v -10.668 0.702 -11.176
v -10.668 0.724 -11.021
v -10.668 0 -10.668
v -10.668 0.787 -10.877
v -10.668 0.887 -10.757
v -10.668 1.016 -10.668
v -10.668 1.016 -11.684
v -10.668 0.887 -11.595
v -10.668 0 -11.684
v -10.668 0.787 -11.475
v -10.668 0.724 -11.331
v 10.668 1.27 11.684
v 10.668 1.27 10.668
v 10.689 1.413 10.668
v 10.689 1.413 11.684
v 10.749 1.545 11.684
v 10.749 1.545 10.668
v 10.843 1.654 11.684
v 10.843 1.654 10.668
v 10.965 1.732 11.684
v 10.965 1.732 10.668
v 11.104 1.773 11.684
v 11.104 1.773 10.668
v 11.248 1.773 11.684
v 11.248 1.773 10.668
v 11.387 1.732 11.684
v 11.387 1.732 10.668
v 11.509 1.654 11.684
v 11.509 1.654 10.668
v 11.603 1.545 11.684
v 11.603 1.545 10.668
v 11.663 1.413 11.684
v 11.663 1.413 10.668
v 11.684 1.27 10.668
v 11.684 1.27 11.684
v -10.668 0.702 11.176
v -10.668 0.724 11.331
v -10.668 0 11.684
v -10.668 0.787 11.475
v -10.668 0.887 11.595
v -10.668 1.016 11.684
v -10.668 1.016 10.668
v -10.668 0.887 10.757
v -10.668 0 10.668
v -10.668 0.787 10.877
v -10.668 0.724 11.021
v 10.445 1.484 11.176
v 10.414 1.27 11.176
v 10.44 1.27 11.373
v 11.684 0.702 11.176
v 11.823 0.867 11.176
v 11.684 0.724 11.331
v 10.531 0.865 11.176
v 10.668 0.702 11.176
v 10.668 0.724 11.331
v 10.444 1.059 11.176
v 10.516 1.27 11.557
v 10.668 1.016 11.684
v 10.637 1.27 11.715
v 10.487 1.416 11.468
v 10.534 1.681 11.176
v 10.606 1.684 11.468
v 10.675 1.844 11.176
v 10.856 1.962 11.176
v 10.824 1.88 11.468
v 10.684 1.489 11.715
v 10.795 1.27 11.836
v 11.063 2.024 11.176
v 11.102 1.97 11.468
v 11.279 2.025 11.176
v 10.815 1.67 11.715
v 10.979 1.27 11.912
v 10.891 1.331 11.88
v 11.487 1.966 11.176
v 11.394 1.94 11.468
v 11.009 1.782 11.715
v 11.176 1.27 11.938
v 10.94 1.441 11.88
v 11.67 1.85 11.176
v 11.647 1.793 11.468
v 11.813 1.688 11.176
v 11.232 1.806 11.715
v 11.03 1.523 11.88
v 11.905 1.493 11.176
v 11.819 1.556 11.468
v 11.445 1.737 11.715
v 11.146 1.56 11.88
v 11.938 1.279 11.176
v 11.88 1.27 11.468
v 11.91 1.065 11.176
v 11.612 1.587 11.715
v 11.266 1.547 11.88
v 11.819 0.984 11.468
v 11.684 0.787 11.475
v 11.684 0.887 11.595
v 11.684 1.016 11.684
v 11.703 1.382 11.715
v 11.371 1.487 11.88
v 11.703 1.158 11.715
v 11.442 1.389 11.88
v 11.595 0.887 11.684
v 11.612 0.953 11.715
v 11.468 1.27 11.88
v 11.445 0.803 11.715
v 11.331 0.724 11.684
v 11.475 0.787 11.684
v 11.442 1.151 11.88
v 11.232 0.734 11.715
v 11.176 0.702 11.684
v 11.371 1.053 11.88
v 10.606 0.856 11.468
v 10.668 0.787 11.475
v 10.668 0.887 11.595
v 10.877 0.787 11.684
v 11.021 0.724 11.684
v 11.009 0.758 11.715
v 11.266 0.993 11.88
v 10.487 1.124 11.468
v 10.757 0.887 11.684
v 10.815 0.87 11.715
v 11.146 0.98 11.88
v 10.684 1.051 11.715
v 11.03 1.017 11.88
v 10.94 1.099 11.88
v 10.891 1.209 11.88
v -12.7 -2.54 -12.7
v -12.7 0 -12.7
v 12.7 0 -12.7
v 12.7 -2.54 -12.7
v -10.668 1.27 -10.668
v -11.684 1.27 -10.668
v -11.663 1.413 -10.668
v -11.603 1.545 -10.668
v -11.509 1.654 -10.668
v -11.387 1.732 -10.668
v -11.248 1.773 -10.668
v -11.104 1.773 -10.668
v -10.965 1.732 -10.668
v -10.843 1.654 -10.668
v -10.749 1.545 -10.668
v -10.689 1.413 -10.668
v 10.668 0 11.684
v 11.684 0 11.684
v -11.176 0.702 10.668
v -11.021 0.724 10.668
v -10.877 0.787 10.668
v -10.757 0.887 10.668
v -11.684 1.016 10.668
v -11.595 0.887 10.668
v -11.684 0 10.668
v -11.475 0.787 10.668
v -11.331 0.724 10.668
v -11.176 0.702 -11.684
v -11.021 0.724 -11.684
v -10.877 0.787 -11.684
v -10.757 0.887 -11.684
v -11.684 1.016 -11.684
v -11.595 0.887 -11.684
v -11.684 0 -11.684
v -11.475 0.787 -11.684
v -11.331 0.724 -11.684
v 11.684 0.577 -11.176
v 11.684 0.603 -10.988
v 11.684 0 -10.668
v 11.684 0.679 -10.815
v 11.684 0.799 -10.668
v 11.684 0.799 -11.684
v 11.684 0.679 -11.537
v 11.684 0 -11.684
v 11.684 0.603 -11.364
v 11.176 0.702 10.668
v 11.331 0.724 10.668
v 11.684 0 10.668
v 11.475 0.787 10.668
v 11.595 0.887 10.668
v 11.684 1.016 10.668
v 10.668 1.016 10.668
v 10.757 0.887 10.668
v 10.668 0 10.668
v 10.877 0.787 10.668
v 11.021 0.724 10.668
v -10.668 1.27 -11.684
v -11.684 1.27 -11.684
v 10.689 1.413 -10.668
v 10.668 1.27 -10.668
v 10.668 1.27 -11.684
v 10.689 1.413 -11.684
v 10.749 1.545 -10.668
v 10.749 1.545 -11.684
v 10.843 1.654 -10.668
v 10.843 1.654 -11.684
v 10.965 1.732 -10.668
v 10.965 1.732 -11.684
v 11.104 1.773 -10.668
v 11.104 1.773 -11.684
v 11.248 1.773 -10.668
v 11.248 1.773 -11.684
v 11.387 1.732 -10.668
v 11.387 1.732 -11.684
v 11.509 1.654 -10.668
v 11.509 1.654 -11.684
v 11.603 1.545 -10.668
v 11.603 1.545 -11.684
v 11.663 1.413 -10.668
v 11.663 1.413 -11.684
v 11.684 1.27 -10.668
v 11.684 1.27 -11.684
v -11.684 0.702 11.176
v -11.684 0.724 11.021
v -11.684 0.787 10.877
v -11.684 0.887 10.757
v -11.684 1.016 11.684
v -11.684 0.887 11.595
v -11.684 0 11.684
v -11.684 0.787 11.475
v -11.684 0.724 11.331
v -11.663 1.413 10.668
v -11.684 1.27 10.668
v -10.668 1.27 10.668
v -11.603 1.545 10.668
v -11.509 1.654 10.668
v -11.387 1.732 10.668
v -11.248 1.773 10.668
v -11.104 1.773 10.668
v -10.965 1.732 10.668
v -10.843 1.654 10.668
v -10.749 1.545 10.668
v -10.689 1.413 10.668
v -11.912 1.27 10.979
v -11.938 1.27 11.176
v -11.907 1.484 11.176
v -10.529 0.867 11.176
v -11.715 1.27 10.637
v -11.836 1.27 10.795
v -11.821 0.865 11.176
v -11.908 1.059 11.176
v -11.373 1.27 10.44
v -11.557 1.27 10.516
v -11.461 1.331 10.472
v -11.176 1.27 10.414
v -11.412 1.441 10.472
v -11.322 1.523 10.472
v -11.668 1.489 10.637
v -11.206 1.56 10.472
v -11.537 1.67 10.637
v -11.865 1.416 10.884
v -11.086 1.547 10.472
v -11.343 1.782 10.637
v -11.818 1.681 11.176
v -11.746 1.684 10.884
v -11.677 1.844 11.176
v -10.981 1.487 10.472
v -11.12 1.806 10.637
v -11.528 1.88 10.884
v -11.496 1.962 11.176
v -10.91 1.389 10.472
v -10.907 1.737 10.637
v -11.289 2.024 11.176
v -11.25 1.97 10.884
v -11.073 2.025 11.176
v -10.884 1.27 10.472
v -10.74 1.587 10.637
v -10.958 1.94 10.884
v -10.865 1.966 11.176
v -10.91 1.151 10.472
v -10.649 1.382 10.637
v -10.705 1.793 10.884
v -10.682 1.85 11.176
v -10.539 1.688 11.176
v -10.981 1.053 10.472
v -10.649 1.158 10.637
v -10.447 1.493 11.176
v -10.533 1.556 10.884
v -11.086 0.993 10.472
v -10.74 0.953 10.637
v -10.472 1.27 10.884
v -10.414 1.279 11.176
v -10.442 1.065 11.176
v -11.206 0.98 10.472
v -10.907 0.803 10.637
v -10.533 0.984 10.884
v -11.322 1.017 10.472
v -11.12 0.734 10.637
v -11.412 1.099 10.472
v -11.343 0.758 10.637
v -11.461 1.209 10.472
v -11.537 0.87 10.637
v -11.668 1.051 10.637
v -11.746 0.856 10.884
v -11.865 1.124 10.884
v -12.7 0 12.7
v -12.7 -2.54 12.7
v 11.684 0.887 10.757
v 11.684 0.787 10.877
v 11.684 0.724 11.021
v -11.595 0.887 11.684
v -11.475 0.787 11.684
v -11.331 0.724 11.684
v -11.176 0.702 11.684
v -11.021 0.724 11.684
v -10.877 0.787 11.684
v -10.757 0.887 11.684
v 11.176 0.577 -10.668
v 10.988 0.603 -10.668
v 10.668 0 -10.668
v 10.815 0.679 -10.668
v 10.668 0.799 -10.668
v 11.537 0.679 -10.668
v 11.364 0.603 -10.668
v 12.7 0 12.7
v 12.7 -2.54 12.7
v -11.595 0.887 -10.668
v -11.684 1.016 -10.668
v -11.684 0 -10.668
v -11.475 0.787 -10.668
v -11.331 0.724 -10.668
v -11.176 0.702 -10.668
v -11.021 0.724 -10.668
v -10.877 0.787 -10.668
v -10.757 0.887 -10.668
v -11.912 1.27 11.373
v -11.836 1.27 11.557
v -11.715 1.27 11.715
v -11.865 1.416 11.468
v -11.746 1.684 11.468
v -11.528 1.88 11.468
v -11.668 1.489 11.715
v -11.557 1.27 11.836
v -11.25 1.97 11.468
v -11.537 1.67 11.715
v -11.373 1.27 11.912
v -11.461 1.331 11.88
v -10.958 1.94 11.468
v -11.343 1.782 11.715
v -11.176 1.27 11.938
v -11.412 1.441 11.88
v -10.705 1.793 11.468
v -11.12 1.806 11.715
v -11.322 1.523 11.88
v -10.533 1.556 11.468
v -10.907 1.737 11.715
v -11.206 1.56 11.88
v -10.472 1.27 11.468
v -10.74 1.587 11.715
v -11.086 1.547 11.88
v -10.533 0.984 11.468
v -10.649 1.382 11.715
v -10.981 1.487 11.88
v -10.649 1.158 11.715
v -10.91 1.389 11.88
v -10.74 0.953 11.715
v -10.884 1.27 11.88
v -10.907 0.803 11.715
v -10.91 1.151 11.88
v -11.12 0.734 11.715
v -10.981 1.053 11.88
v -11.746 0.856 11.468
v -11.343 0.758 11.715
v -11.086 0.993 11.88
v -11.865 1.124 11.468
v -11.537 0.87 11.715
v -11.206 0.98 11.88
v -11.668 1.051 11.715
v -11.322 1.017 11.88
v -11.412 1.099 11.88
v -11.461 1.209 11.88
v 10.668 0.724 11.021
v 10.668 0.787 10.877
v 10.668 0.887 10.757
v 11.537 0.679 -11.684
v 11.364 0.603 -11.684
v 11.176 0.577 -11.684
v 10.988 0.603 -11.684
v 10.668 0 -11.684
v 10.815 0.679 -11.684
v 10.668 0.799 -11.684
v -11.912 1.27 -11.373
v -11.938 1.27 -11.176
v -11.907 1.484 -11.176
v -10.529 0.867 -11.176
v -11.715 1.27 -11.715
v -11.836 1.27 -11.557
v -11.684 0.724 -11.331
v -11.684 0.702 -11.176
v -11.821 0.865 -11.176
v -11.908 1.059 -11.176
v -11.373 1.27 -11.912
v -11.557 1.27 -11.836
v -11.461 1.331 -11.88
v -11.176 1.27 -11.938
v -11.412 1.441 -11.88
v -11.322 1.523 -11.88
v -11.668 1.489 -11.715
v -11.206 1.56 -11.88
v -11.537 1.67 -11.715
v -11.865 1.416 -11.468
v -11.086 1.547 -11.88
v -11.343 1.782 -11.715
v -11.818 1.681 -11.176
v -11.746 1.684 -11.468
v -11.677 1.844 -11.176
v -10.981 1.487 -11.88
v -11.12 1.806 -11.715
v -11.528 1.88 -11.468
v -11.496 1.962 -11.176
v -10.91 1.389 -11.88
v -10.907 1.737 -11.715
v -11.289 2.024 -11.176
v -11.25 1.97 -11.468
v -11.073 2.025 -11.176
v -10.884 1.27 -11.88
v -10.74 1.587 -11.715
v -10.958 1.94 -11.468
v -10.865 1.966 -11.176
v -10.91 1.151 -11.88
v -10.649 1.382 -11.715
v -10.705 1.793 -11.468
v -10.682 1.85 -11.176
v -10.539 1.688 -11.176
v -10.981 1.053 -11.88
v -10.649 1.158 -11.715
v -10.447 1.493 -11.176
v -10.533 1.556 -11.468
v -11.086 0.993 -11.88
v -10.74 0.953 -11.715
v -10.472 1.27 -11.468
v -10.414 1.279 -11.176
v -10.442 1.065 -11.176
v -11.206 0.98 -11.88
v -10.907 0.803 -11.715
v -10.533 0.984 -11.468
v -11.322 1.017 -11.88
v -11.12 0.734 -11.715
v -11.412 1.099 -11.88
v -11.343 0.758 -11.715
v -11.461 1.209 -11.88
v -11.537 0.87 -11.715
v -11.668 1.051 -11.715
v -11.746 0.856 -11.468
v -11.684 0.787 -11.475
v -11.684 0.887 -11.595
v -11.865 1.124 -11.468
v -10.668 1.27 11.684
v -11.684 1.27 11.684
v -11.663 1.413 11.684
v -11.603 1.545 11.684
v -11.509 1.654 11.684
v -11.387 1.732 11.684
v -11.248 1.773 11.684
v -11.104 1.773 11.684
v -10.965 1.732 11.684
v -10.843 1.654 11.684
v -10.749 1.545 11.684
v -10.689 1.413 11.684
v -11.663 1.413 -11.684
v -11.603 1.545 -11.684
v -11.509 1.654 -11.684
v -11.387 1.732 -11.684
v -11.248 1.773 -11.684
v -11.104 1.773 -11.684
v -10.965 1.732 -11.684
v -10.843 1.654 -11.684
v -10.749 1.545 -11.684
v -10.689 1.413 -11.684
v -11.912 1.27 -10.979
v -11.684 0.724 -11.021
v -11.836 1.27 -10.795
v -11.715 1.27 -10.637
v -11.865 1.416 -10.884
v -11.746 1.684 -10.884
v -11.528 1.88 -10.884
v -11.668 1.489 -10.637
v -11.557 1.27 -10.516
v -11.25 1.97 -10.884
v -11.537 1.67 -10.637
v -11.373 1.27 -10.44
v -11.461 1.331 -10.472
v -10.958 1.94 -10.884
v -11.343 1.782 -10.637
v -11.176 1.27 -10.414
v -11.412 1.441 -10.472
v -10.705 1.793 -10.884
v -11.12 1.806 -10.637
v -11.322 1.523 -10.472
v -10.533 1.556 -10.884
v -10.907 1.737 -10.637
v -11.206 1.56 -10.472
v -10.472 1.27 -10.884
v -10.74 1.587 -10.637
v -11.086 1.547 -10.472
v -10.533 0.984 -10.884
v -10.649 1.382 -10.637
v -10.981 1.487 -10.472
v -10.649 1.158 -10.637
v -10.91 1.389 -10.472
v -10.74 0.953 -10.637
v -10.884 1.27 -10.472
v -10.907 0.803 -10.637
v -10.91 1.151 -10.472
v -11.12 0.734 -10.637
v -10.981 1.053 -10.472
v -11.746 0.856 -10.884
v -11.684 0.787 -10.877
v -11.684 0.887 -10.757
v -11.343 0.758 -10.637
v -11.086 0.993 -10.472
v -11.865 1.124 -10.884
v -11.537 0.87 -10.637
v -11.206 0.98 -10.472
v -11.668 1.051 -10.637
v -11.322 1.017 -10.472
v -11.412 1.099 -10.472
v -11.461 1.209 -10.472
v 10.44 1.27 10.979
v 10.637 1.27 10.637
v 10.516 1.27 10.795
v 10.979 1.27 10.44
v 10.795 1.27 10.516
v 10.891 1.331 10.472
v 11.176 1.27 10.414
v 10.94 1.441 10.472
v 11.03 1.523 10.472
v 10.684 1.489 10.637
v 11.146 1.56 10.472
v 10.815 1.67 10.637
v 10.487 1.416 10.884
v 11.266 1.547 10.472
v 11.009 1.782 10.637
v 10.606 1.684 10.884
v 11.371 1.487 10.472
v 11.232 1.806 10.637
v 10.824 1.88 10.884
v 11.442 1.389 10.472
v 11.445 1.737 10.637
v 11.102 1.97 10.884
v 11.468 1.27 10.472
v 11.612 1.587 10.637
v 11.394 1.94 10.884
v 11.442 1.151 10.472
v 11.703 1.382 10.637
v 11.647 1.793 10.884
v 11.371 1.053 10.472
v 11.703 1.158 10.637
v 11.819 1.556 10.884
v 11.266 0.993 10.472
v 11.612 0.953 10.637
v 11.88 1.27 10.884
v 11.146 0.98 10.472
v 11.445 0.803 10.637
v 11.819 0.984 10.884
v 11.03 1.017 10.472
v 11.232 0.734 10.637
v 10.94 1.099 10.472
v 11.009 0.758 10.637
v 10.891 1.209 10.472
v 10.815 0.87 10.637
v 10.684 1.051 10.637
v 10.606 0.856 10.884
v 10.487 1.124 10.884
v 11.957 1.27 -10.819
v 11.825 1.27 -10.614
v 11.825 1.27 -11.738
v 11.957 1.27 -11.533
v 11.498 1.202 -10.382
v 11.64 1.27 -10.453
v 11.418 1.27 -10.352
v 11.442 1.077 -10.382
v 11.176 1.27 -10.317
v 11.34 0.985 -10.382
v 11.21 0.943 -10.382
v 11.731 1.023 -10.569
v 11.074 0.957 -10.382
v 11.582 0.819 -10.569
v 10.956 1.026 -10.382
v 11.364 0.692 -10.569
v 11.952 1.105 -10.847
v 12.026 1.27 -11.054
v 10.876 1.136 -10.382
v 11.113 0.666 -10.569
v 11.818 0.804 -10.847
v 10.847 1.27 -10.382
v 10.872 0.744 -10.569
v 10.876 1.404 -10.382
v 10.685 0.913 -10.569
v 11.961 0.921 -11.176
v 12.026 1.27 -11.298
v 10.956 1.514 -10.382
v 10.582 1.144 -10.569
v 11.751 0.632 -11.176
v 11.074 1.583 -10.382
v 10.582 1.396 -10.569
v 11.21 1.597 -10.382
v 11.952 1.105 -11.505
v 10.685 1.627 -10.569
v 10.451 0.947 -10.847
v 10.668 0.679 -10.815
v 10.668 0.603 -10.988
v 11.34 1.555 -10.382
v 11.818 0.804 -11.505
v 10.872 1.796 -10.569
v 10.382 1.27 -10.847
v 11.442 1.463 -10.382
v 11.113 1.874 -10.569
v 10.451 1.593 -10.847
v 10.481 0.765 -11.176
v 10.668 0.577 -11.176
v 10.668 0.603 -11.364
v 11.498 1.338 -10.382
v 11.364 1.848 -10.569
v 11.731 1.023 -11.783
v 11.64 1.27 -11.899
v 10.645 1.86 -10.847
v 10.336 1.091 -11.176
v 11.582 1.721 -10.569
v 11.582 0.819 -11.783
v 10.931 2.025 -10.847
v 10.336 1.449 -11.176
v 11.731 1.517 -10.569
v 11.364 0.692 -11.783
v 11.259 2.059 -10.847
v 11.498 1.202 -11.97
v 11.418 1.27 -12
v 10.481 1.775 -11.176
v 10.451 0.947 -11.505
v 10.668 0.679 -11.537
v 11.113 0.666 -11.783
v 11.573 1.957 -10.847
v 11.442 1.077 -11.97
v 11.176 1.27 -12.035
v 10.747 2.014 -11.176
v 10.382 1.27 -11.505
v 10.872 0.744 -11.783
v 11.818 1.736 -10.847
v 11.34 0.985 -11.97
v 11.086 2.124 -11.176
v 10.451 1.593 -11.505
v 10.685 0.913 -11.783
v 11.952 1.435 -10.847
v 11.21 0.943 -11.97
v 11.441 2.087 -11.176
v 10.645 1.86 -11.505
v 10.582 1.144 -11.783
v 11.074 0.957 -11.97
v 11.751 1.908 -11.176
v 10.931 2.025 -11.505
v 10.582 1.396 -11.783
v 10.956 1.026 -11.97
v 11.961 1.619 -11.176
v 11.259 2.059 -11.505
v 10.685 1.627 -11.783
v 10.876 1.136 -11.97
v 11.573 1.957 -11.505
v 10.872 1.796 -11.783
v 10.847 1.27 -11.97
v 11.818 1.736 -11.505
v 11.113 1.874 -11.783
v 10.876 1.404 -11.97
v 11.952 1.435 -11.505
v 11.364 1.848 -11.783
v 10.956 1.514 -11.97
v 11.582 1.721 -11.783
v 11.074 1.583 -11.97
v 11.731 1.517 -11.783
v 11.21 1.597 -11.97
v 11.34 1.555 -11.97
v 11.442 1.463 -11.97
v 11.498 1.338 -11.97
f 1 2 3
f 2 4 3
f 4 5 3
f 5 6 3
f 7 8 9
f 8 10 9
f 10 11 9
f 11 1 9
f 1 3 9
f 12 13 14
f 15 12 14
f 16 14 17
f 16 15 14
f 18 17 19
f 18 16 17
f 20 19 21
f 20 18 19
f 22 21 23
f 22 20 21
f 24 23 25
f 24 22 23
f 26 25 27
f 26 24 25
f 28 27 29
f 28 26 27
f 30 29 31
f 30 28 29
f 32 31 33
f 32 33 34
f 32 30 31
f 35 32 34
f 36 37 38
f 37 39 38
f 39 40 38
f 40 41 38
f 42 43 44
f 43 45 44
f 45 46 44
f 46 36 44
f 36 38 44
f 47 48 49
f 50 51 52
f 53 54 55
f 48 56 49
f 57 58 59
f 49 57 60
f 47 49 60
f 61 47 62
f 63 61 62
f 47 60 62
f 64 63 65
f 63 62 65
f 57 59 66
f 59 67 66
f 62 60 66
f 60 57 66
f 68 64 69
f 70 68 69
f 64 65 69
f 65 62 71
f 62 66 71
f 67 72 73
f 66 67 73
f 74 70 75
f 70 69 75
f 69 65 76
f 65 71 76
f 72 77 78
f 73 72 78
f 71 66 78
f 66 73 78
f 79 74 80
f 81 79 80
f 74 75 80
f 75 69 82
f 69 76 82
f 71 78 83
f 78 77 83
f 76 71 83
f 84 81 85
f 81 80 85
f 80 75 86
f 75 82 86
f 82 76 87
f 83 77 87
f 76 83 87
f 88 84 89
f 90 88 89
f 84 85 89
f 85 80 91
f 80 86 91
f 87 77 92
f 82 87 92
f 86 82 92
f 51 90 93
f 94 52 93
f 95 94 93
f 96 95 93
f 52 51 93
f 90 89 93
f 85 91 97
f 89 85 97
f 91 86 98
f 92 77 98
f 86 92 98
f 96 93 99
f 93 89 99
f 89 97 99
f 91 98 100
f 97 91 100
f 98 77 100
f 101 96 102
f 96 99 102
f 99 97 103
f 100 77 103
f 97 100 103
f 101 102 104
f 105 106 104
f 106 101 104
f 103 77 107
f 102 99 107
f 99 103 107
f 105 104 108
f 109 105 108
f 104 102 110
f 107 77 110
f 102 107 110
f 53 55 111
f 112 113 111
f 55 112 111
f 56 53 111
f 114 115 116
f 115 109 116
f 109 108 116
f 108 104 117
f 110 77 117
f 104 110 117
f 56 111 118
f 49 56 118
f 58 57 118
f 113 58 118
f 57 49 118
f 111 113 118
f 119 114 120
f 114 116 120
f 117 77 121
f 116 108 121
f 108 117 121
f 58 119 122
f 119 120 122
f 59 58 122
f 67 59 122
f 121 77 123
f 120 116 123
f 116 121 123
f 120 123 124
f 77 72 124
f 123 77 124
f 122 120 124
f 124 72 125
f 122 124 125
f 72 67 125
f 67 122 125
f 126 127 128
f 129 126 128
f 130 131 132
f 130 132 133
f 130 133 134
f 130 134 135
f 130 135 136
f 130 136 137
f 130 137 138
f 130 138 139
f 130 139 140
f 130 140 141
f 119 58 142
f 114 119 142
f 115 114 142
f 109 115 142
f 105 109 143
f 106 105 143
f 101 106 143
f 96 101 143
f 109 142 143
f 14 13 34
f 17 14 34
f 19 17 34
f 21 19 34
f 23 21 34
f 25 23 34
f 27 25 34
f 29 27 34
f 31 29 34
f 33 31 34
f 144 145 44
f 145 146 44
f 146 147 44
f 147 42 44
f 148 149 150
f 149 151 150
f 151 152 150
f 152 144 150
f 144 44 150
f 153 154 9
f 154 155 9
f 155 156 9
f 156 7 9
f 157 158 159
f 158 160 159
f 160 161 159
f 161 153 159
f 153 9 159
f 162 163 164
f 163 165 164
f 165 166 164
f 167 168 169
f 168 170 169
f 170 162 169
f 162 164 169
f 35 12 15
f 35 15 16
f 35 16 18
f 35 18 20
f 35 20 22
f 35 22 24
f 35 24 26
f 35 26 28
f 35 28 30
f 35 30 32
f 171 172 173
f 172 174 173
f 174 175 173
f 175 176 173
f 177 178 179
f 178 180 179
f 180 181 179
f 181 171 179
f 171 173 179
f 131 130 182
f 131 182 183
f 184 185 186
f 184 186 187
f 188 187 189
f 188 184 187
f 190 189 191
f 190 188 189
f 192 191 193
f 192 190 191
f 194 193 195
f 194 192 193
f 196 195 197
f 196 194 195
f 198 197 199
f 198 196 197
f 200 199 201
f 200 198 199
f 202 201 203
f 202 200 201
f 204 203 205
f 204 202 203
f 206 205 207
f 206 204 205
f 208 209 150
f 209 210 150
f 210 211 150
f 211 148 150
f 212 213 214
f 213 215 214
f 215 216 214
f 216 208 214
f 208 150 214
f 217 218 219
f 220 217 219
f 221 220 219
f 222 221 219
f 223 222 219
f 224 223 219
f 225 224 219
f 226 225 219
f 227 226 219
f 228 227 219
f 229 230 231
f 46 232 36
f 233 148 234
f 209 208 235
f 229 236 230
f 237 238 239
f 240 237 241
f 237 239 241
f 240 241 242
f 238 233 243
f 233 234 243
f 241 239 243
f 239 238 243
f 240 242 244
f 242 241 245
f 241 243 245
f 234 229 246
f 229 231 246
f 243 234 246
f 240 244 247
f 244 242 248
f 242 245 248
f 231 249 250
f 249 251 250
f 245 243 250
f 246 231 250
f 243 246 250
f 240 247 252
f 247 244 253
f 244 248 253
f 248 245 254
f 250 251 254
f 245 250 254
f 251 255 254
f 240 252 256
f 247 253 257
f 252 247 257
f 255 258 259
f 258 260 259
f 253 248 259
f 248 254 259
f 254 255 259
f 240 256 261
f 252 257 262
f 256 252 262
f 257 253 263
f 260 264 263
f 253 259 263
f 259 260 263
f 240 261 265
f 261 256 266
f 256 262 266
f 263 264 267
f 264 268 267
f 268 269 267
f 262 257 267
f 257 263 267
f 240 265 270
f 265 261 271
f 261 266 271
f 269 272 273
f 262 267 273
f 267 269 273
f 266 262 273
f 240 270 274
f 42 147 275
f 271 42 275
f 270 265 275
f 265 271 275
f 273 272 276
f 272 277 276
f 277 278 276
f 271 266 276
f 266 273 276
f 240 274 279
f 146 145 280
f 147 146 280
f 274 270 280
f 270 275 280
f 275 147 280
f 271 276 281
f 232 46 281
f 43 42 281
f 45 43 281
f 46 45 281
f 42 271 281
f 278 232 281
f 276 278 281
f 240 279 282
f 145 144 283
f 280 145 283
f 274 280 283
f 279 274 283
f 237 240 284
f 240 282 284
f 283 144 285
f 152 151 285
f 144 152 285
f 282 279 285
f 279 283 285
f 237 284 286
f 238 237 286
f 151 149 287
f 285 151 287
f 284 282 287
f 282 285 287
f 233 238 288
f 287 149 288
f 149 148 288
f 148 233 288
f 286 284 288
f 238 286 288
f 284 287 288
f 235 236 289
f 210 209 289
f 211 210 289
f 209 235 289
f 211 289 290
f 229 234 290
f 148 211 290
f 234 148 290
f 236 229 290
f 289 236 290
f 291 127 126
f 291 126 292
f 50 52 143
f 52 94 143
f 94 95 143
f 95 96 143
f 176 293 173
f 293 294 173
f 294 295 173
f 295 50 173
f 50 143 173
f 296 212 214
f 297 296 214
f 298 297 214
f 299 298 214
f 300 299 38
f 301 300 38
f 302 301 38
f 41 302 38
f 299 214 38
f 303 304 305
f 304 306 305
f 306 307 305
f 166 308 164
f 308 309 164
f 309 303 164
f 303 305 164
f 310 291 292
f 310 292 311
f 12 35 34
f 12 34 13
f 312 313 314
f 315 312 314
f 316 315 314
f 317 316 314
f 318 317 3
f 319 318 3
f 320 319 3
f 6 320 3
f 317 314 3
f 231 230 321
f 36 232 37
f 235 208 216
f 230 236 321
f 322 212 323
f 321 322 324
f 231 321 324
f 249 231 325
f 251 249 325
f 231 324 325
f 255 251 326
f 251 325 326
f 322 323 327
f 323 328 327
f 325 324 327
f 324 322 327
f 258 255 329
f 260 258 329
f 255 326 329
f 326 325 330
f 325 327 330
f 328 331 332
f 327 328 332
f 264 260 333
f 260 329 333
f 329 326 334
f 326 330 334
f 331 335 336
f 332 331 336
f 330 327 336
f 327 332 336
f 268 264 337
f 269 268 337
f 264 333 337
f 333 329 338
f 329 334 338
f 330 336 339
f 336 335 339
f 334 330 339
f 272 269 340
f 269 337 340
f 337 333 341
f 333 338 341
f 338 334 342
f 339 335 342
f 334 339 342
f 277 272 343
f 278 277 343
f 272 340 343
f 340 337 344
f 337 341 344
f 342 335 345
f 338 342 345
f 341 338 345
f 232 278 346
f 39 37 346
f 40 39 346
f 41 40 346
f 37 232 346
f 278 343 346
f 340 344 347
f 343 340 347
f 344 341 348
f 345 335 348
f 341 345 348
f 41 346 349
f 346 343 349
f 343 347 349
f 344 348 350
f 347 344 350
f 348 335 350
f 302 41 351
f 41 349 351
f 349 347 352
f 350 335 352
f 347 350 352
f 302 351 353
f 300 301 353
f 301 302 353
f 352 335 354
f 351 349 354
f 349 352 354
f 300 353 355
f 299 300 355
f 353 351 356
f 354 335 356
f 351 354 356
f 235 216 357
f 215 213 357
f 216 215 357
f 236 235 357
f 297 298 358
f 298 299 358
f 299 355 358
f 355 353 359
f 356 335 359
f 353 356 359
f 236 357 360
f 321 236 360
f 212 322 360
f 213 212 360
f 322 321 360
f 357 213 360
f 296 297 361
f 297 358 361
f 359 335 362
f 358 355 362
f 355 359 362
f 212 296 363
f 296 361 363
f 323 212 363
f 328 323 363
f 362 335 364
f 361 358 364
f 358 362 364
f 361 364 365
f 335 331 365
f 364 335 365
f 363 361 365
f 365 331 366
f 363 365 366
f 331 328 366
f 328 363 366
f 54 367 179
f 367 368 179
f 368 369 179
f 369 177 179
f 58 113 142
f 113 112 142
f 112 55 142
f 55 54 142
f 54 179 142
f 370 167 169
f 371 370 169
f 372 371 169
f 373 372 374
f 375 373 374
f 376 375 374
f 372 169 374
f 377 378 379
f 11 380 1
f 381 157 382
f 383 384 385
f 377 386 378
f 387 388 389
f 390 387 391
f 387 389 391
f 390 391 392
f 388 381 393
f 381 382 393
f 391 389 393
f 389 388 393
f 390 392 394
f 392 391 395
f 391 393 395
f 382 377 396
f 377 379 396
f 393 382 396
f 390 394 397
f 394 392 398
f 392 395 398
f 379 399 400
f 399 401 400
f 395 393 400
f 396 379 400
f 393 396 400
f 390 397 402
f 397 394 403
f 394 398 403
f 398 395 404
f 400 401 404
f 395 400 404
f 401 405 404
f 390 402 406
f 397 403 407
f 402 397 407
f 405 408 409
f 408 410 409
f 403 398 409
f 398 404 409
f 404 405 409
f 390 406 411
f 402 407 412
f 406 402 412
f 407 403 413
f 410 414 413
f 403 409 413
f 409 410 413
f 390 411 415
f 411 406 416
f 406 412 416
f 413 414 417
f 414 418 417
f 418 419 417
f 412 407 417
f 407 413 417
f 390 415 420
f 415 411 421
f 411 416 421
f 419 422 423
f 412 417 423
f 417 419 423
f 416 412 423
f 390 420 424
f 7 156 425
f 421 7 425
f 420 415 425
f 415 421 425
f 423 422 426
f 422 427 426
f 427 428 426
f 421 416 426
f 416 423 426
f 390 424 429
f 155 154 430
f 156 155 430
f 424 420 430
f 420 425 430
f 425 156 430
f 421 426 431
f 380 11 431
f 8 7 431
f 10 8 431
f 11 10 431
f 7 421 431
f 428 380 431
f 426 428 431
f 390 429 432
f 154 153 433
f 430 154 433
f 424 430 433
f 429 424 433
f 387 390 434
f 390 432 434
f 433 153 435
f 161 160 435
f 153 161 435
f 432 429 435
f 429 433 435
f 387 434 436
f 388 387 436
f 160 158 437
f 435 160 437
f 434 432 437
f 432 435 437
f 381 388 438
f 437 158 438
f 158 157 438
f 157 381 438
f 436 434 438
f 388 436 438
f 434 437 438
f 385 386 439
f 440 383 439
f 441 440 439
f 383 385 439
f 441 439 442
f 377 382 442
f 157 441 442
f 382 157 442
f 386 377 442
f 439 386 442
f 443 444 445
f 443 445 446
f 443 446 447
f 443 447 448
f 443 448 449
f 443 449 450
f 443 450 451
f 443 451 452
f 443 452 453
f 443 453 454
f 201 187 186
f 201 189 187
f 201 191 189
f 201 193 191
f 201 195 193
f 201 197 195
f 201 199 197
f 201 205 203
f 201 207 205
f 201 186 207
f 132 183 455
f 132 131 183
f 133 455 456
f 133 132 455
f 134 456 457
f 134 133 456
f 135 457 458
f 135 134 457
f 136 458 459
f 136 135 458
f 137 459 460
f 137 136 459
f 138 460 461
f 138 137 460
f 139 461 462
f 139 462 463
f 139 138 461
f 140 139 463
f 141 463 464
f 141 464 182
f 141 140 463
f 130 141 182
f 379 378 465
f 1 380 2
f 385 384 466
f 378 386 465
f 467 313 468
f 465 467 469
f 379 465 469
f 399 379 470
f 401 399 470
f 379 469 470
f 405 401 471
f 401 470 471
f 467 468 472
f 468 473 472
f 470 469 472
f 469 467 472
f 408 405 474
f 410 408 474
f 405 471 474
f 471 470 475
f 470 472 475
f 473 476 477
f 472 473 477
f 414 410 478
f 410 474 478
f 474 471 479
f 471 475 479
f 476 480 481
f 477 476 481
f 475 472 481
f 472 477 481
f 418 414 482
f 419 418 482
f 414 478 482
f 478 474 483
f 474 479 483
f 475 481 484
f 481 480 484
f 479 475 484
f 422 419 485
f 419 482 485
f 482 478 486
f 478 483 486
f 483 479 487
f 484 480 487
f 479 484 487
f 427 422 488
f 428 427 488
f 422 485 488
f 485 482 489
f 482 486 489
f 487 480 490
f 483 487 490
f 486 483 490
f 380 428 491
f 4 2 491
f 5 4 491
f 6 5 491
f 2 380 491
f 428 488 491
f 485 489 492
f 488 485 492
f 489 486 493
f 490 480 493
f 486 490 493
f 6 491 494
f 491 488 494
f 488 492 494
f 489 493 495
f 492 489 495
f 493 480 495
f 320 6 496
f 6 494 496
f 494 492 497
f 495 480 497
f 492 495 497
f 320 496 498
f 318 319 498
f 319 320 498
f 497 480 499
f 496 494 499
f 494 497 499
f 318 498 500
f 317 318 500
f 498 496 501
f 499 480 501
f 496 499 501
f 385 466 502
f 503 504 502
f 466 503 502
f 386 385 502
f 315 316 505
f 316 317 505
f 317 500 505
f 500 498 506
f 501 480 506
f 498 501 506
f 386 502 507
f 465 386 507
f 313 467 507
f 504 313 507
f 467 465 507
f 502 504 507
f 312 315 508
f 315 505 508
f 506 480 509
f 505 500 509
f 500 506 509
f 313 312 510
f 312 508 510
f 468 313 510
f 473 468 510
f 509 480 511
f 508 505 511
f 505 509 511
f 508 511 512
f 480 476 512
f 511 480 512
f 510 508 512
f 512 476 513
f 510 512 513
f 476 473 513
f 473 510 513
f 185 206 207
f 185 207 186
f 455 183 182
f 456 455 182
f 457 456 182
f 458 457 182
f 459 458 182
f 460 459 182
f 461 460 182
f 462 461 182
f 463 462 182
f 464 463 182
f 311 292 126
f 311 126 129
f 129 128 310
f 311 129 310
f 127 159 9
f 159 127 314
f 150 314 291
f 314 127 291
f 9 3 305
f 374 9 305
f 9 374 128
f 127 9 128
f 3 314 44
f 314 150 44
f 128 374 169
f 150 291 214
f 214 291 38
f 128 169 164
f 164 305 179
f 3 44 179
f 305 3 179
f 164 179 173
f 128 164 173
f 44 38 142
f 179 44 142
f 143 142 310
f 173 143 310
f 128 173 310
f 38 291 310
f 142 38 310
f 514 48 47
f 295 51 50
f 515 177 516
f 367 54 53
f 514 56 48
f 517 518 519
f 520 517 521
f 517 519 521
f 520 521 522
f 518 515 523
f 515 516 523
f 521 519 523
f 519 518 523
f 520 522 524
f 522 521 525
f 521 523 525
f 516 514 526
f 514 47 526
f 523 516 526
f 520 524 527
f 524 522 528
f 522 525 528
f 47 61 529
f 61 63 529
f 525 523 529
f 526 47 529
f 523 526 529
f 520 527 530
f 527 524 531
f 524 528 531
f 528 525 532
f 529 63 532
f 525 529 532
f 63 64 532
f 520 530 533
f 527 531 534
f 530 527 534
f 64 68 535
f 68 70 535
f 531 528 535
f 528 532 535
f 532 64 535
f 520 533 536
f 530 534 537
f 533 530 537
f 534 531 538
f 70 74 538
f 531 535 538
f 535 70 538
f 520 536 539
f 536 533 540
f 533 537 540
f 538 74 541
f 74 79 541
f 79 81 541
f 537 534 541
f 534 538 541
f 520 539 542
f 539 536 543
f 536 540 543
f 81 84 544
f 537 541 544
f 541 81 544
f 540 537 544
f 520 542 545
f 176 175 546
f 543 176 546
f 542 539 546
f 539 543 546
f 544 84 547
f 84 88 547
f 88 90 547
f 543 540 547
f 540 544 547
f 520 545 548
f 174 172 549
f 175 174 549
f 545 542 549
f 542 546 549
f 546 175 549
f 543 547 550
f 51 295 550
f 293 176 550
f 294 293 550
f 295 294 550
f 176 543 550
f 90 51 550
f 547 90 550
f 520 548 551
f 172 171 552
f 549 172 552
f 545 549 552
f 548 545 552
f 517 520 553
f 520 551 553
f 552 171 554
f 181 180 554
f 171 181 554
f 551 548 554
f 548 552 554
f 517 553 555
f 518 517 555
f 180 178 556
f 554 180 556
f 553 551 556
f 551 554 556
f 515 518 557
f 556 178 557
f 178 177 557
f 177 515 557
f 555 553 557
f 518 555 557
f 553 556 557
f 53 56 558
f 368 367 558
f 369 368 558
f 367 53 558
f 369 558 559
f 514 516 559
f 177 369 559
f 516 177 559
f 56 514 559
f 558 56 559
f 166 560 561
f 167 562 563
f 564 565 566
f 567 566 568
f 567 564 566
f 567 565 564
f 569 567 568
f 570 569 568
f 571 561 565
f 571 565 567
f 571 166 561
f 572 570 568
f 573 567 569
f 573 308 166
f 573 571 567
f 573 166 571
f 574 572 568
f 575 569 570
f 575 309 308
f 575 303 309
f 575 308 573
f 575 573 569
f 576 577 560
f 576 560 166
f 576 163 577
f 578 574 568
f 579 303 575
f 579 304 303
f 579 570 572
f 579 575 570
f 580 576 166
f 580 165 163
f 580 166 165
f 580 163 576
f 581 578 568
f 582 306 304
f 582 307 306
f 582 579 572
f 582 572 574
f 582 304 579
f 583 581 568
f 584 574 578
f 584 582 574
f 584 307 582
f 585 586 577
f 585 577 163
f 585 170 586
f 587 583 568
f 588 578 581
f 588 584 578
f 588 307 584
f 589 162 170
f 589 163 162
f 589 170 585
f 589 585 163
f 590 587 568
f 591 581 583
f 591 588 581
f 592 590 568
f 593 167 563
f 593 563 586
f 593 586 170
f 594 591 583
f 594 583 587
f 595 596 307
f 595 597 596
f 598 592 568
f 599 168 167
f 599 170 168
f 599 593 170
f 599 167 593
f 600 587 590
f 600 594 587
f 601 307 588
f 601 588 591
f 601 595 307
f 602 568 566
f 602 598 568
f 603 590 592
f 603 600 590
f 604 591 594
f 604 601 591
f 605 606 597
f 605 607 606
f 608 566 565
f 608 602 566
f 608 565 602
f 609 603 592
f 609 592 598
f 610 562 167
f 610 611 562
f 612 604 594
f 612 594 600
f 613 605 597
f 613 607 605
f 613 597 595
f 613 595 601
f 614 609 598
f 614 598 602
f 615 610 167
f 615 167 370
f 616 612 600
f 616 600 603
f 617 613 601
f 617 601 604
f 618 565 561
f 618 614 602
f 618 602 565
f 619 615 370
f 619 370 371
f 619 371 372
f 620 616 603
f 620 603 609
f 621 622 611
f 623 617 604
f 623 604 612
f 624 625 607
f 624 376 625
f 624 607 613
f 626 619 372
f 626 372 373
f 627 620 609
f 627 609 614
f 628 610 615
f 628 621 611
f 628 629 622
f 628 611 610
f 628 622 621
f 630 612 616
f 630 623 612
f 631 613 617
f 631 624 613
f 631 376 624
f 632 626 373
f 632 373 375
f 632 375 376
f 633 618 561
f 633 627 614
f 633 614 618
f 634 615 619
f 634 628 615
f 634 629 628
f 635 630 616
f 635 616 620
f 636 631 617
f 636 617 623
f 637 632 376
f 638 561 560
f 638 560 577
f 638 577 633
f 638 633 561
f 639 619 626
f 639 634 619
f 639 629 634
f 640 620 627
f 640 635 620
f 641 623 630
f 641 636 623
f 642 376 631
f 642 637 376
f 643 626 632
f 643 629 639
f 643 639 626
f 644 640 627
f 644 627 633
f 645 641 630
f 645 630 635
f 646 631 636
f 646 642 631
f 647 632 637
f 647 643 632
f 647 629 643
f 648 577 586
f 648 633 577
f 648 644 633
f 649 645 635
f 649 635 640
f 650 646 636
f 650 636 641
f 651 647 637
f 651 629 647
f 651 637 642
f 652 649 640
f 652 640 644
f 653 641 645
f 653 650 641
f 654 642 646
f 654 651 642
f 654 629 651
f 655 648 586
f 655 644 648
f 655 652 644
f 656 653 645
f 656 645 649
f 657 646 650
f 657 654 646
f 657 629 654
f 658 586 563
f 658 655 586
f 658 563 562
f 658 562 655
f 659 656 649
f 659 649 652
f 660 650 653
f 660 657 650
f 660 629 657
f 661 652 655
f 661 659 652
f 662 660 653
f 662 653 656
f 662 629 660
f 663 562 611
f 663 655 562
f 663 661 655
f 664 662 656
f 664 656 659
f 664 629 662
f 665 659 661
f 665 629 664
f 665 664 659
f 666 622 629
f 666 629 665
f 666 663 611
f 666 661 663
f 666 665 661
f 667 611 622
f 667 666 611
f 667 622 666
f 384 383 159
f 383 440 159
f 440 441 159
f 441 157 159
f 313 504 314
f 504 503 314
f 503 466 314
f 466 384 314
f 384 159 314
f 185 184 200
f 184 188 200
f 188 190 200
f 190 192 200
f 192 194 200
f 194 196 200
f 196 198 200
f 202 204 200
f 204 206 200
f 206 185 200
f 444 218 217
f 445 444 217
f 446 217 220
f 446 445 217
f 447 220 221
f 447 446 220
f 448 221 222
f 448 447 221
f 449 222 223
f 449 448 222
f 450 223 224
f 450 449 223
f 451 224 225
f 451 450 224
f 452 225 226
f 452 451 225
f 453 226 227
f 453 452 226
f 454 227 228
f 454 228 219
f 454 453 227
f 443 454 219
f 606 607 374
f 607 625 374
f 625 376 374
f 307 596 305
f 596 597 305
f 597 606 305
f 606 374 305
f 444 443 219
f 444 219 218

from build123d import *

# Parameters (mm, degrees)
F0_W     = 25.4
F0_H     = 25.4
F1_DEPTH = 2.54
F3_DEPTH = 1.27
F4_W     = 0.508
F4_H     = 1.016
F6_W     = 0.508
F6_H     = 1.016
F8_W     = 0.508
F8_H     = 1.016
F10_W    = 0.508
F10_H    = 1.016


with BuildPart() as f1:
    # F0 (on Front) → F1 (new body)
    with BuildSketch(Plane.XZ):
        Rectangle(F0_W, F0_H)
    extrude(amount=F1_DEPTH)

    # F2 (on face) → F3 (join)
    with BuildSketch(Plane(origin=(0, 0, 0), x_dir=(-1, 0, 0), z_dir=(0, 1, 0))):
        Polygon((-10.668, 10.668), (-10.668, 11.684), (-11.176, 11.684), (-11.684, 11.684), (-11.684, 10.668), align=None)
        Polygon((11.684, 10.668), (11.684, 11.684), (11.176, 11.684), (10.668, 11.684), (10.668, 10.668), align=None)
        Polygon((-10.668, -11.684), (-10.668, -10.668), (-11.684, -10.668), (-11.684, -11.684), (-11.176, -11.684), align=None)
        Polygon((11.684, -11.684), (11.684, -10.668), (10.668, -10.668), (10.668, -11.684), (11.176, -11.684), align=None)
    extrude(amount=F3_DEPTH)

    # F4 (on face) → F5 (revolve)
    with BuildSketch(Plane(origin=(0, 1.27, 0), x_dir=(-1, 0, 0), z_dir=(0, 1, 0))):
        with BuildLine():
            ThreePointArc((-11.176, 10.414), (-10.6371846327, 10.6371846327), (-10.414, 11.176))
            ThreePointArc((-10.414, 11.176), (-10.6371846327, 11.7148153673), (-11.176, 11.938))
            Line((-11.176, 11.938), (-11.176, 11.684))
            Line((-11.176, 11.684), (-10.668, 11.684))
            Line((-10.668, 11.684), (-10.668, 10.668))
            Line((-10.668, 10.668), (-11.176, 10.668))
            Line((-11.176, 10.668), (-11.176, 10.414))
        make_face()
        with Locations((-10.922, 11.176)):
            Rectangle(F4_W, F4_H)
        with Locations((-11.43, 11.176)):
            Rectangle(F4_W, F4_H)
    revolve(axis=Axis((11.176, 1.27, 11.176), (0, 0, -1)))

    # F6 (on face) → F7 (revolve)
    with BuildSketch(Plane(origin=(0, 1.27, 0), x_dir=(-1, 0, 0), z_dir=(0, 1, 0))):
        with BuildLine():
            ThreePointArc((11.176, 10.414), (11.7148153673, 10.6371846327), (11.938, 11.176))
            ThreePointArc((11.938, 11.176), (11.7148153673, 11.7148153673), (11.176, 11.938))
            Line((11.176, 11.938), (11.176, 11.684))
            Line((11.176, 11.684), (11.684, 11.684))
            Line((11.684, 11.684), (11.684, 10.668))
            Line((11.684, 10.668), (11.176, 10.668))
            Line((11.176, 10.668), (11.176, 10.414))
        make_face()
        with Locations((11.43, 11.176)):
            Rectangle(F6_W, F6_H)
        with Locations((10.922, 11.176)):
            Rectangle(F6_W, F6_H)
    revolve(axis=Axis((-11.176, 1.27, 11.176), (0, 0, -1)))

    # F8 (on face) → F9 (revolve)
    with BuildSketch(Plane(origin=(0, 1.27, 0), x_dir=(-1, 0, 0), z_dir=(0, 1, 0))):
        with BuildLine():
            ThreePointArc((11.176, -11.938), (11.7148153673, -11.7148153673), (11.938, -11.176))
            ThreePointArc((11.938, -11.176), (11.7148153673, -10.6371846327), (11.176, -10.414))
            Line((11.176, -10.414), (11.176, -10.668))
            Line((11.176, -10.668), (11.684, -10.668))
            Line((11.684, -10.668), (11.684, -11.684))
            Line((11.684, -11.684), (11.176, -11.684))
            Line((11.176, -11.684), (11.176, -11.938))
        make_face()
        with Locations((11.43, -11.176)):
            Rectangle(F8_W, F8_H)
        with Locations((10.922, -11.176)):
            Rectangle(F8_W, F8_H)
    revolve(axis=Axis((-11.176, 1.27, -11.176), (0, 0, -1)))

    # F10 (on face) → F11 (revolve)
    with BuildSketch(Plane(origin=(0, 1.27, 0), x_dir=(-1, 0, 0), z_dir=(0, 1, 0))):
        with BuildLine():
            Line((-11.176, -10.668), (-11.176, -10.3170624905))
            ThreePointArc((-11.176, -10.3170624905), (-12.0349375095, -11.176), (-11.176, -12.0349375095))
            Line((-11.176, -12.0349375095), (-11.176, -11.684))
            Line((-11.176, -11.684), (-11.684, -11.684))
            Line((-11.684, -11.684), (-11.684, -10.668))
            Line((-11.684, -10.668), (-11.176, -10.668))
        make_face()
        with Locations((-10.922, -11.176)):
            Rectangle(F10_W, F10_H)
        with Locations((-11.43, -11.176)):
            Rectangle(F10_W, F10_H)
    revolve(axis=Axis((11.176, 1.27, -11.176), (0, 0, -1)))


solid = f1.part
